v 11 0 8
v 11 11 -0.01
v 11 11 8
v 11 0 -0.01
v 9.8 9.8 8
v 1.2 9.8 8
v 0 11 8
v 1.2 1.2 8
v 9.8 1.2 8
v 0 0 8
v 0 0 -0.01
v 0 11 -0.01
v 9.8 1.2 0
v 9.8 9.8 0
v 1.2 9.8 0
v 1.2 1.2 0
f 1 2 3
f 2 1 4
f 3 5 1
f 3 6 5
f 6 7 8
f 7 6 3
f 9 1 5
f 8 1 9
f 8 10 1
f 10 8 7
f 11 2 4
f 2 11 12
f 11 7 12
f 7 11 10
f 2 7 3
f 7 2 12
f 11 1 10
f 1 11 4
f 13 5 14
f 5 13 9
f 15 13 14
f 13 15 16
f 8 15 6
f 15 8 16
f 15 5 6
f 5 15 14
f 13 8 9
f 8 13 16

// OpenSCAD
// file: ../Base/Rotation.scad
// Fischertechnik Box Foundation
// Geometry Helpers Rotation

include <PlacementOptions.scad>

// getRotatedSpace(space, rotation=NoRotation)
// Rotates the space dependent on the specified rotation

function getRotatedSpace(space, rotation=NoRotation) = [
    (rotation == Rotate90 || rotation == Rotate270) ? space.y : space.x,
    (rotation == Rotate90 || rotation == Rotate270) ? space.x : space.y
];

// Rotates the given space around the fixed left lower corner
// space = the space the children needs as width/depth list [width,depth]
// rotation = 0 Rotate0 degrees, 1 Rotate90 degrees, 2 Rotate180 degrees, 3 Rotate270 degrees (equivalent to -90)

module RotateFix(space, rotation=NoRotation) {
    dy = (rotation == Rotate0 || rotation == Rotate270) ? 0 :
        (rotation == Rotate90) ? space.x :
        space.y;
    dx = (rotation < Rotate180) ? 0 :
        (rotation == Rotate180) ? space.x :
        space.y;
    
    translate([dx, dy, 0])
        rotate([0, 0, rotations[rotation]])
            children();
}
// file: ../Base/Alignment.scad
// Fischertechnik Box Foundation
// Geometry Helpers Alignment

include <PlacementOptions.scad>

// getAlignedX(elementWidth, spaceWidth, align=AlignRight, offset=0)
// Gets the aligned X offset of an element with the given
// width in the given space.
// elementWidth = The width of the element to positon
// spaceWidth = The space where the element should be aligned
// align = 0 AlignLeft, 1 AlignCenter, 2 AlignRight
// offset = an optional offset from the aligned position. When
// aligned left or centered, then positive values are in X direction.
// When aligned right then positive values are in negative X direction.

function getAlignedX(elementWidth, spaceWidth, align=AlignRight, offset=0) =
    (align == AlignLeft) ?
        offset :
        ((align == AlignCenter) ?
        (spaceWidth - elementWidth)/2 + offset :
        spaceWidth - offset - elementWidth);

// getAlignedY(elementDepth, spaceDepth, align=AlignTop, offset=0)
// Gets the aligned Y offset of an element with the given
// depth in the given space.
// elementDepth = The depth of the element to positon
// spaceDepth = The space where the element should be aligned
// align = 0 AlignBottom, 1 AlignCenter, 2 AlignTop
// offset = an optional offset from the aligned position. When
// aligned bottom or centered, then positive values are in Y direction.
// When aligned top then positive values are in negative Y direction.

function getAlignedY(elementDepth, spaceDepth, align=AlignTop, offset=0) =
    (align == AlignBottom) ?
        offset :
        ((align == AlignCenter) ?
        (spaceDepth - elementDepth)/2 + offset :
        spaceDepth - offset - elementDepth);
// file: ../Base/PlacementOptions.scad
// Fischertechnik Box Foundation
// Placement Options

// Alignment
NoAlign = 0;
AlignLeft = 1;
AlignBottom = 2;
AlignCenter = 3;
AlignRight = 4;
AlignTop = 5;

// Element rotation degree steps
rotations = [0, -90, -180, -270];

// Rotation
NoRotation = 0;
Rotate0 = 0;
Rotate90 = 1;
Rotate180 = 2;
Rotate270 = 3;

// Docking (seen from above)
NoDock = -1;
DockLeft = 0;
DockTop = 1;
DockRight = 2;
DockCorner = 2;
DockBottom = 3;

// Web corners
LowerLeft = 0;
UpperLeft = 1;
UpperRight = 2;
LowerRight = 3;

// Web position relative to corner
LeftOfCorner = 0;
RightOfCorner = 1;
// file: ../Base/Boxes.scad
// Fischertechnik Box Foundation
// Pre-designed Boxes

use <Constants.scad>

include <PlacementOptions.scad>

box190Width = 190;
box190Depth = 130;
box130Width = 130;
box130Depth = 95;

// Values are from an original ec3 box
topBottomDifference = 1.5;
outerHeight = 40;
baseThickness = 1.8;
innerHeight = outerHeight - baseThickness;
stackExcess = 5.7;
radius = 3.5;
wallThickness = 1.5;
tolerance = 0.2;

boxWallThickness = wallThickness;
boxBaseThickness = baseThickness;
boxWebWidth = 3.0;

// getBoxWallThickness()
// Gets the wall thickness of a Fischertechnik Box
function getBoxWallThickness() = boxWallThickness;

// getBoxUsageHeight(height = 38.2)
// Gets the usable height of a Fischertechnik box
// height = Outer height of the box from the bottom to the upper edge.
function getBoxUsageHeight(height = outerHeight) = height - baseThickness - stackExcess;

// getBoxInnerHeight()
// Gets the inner height of a Fischertechnik box, including the stack excess
function getBoxInnerHeight() = innerHeight;

// getBoxBaseThickness()
// Gets the thickness of the Fischertechnik box base.
function getBoxBaseThickness() = boxBaseThickness;

// getBoxWebWidth()
// Gets the width of a box web
function getBoxWebWidth() = boxWebWidth;

// getBox190Space()
// Gets the usable inner space of a Box 190 as an x/y-list
function getBox190Space() = [
    box190Width - 2*getBoxWallThickness() - topBottomDifference, 
    box190Depth - 2*getBoxWallThickness() - topBottomDifference ];

// RoundedCornerPlate(width, depth, height, radius)
// Creates a body plate with rounded corners for a box. Used
// also to create the complete box with the hull module.
// width = Width of the plate
// depth = depth of the plate 
// height = thickness of the plate
// radius = radius of the rounded corner
module RoundedCornerPlate(width, depth, height, radius) {
    translate([radius, radius])
    hull() {
        w = width-2*radius;
        d = depth-2*radius;
        cube([w, d, height]);
        cylinder(height, r=radius, $fn=getFragments());
        translate([w, 0])
            cylinder(height, r=radius, $fn=getFragments());
        translate([w, d])
            cylinder(height, r=radius, $fn=getFragments());
        translate([0, d])
            cylinder(height, r=radius, $fn=getFragments());
    }
}

// BoxBase(width, depth)
// Creates an empty stackable Fischertechnik compatible box
// width = Outer width of the box (190, 130, ...)
// depth = Outer depth of the box (130, 95, ...)

module BoxBase(width, depth, height=outerHeight) {    
    thinPlate = 0.01;

    innerHeight = height - baseThickness;    
    
    module Body(tolerance=tolerance) {
        hull() {
            // Bottom with tolerance to fit into the original boxes when stacked
            translate([-wallThickness+tolerance, -wallThickness+tolerance, -baseThickness])
                RoundedCornerPlate(width-topBottomDifference-2*tolerance, depth-topBottomDifference-2*tolerance, thinPlate, radius);
            
            // Top
            translate([-wallThickness-topBottomDifference/2, -wallThickness-topBottomDifference/2, innerHeight-thinPlate])
                RoundedCornerPlate(width, depth, thinPlate, radius);
         }
    }

    module Cutoff() {
        hull() {
            coWidth = width - 2*wallThickness;
            coDepth = depth - 2*wallThickness;
            
            // Bottom
            RoundedCornerPlate(coWidth-topBottomDifference, coDepth-topBottomDifference, thinPlate, radius);

            // Top
            translate([-topBottomDifference/2, -topBottomDifference/2, innerHeight+thinPlate]) 
                RoundedCornerPlate(coWidth, coDepth, thinPlate, radius);
        }
    }
    
    difference() {        
        Body();
        Cutoff();
        stackOffset = innerHeight - stackExcess;
        translate([0, 0, stackOffset + baseThickness])
            Body(tolerance=0);
    }
}

// Creates the Fischertechnik empty box 130x190 mm and places it at position 0,0
// 190x130 are the outer sizes, the inner space is slightly smaller. Use getBox190Space() to get the inner sizes.
// The box is positioned that the usable inner space is at the 0,0,0 position.

module Box190() {
    BoxBase(box190Width, box190Depth);
}

// Gets the usable inner space of a Box 130 as an x/y-list
function getBox130Space() = [
    box130Width - 2*getBoxWallThickness() - topBottomDifference, 
    box130Depth - 2*getBoxWallThickness() - topBottomDifference ];

// Creates the Fischertechnik empty box 95x130 mm and places it at position 0,0
// 190x130 are the outer sizes, the inner space is slightly smaller. Use getBox190Space() to get the inner sizes.
// The box is positioned that the usable inner space is at the 0,0,0 position.

module Box130() {
    BoxBase(box130Width, box130Depth);
}

// Creates a web at the specified box walls
// corner 0 = LowerLeft, 1 = UpperLeft, 2 = UpperRight, 3 = LowerRight
// side 0 = LeftOfCorner, 1 = RightOfCorner
// distance = Distance in mm from the corner
// boxSpace = inner width and depth of the box (default: Box 190)
// webWidth = length of the web (default is 3 mms)
// webThickness = thickness of the web (default is 1 mm)
// height = Height of the web (standard is getBoxUsageHeight())
// sink = How much of the web is sunk into the wall

module BoxWeb(
    corner, 
    side, 
    distance, 
    boxSpace=getBox190Space(), 
    webWidth=getBoxWebWidth(), 
    webThickness=1.0, 
    height=getBoxUsageHeight(),
    sink = getBoxWallThickness()/2) {
    width = (corner % 2 == 0) ? 
            (side == LeftOfCorner ? webWidth : webThickness) :
            (side == LeftOfCorner ? webThickness : webWidth);

    depth = (corner % 2 == 0) ? 
            (side == RightOfCorner ? webWidth : webThickness) :
            (side == RightOfCorner ? webThickness : webWidth);
    
    xDiff = corner == LowerLeft ? 
                (side == LeftOfCorner ? -sink : distance) :
            (corner == UpperLeft ?                
                (side == LeftOfCorner ? distance : -sink) :
            (corner == UpperRight ?
                (side == LeftOfCorner ? boxSpace.x-webWidth+sink : boxSpace.x-distance-webThickness) :
                (side == LeftOfCorner ? boxSpace.x-distance-webThickness: boxSpace.x-webWidth+sink)));

    yDiff = corner == LowerLeft ? 
                (side == RightOfCorner ? -sink : distance) :
            (corner == UpperLeft ?
                (side == RightOfCorner ? boxSpace.y-distance-webThickness : boxSpace.y-webWidth+sink) :
            (corner == UpperRight ?
                (side == RightOfCorner ? boxSpace.y-webWidth+sink : boxSpace.y-distance-webThickness) :
                (side == RightOfCorner ? distance : -sink)));
    
    translate([xDiff, yDiff, -getExcess()])
        cube([width, depth, height + 2*getExcess()]);
}
// file: ../Base/Placement.scad
// Fischertechnik Box Foundation
// Geometry Helpers Placement

use <Constants.scad>
use <Alignment.scad>
use <Rotation.scad>
use <Boxes.scad>

include <PlacementOptions.scad>

// Place(x=0, y=0, elementSpace=[0,0], alignX=AlignLeft, alignY=AlignBottom, rotation=Rotate0, boxSpace=getBox190Space())
// Places the child at the specified position
// y = Y-Position. This is a relative position when an X aligment is specified.
// x = X-Position. This is a relative position when an Y aligment is specified.
// elementSpace = space of the element to be placed [x,y]
// alignX = -1=NoAlign, 0 AlignLeft, 1 AlignCenter, 3 AlignRight (elementSpace and boxSpace required!)
// alignY = -1=NoAlign, 2 AlignBottom, 1 AlignCenter, 4 AlignTop (elementSpace and boxSpace required!)
// rotation = 0 Rotate0 0 degrees, 1 Rotate90 90 degrees, 
// 2 Rotate180 180 degrees, 3 Rotate270 270 degrees (equivalent to -90)
// boxSpace = Inner space of the box where the placement occurs [x,y] - default is Box 190x130 inner space

module Place(x=0, y=0, elementSpace=[0,0], 
  alignX=AlignLeft, alignY=AlignBottom, 
  rotation=NoRotation, boxSpace=getBox190Space()) {

    module Position(x, y, space, rotation=Rotate0) {
        translate([x, y, 0])
            RotateFix(space, rotation)
                children();
    }

    space = getRotatedSpace(elementSpace, rotation);
    alignedX = getAlignedX(space.x, boxSpace.x, alignX, x);
    alignedY = getAlignedY(space.y, boxSpace.y, alignY, y);
    Position(alignedX, alignedY, elementSpace, rotation)
        children();
}

// Center(space=getBox130Space(), elementSpace=[0,0])
// space = Space where the children is centered. For cylinder use centered=true and no elementSpace.
// elementSpace = space of the element to be centered [x,y]

module Center(space=getBox190Space(), elementSpace=[0,0]) {
    Place(elementSpace=elementSpace, boxSpace=space, alignX=AlignCenter, alignY=AlignCenter)
        children();
}

// CenterHorizontal(width=0, y=0, offset=0, space=getBox130Space())
// width = Width of the element to be placed.
// y = Y position of the element
// offset = Offset from the center position (negative will be left of the center)
// space = Space where the element is placed

module CenterHorizontal(width=0, y=0, offset=0, space=getBox190Space()) {
    Place(x=offset, y=y, elementSpace=[width, 0], boxSpace=space, alignX=AlignCenter)
        children(0);
}

// CenterVertical(depth=0, x=0, offset=0, space=getBox130Space())
// depth = Depth of the element to be placed.
// x = X position of the element
// offset = Offset from the center position (negative will be down of the center)
// space = Space where the element is placed

module CenterVertical(depth=0, x=0, offset=0, space=getBox190Space()) {
    Place(x=x, y=offset, elementSpace=[0, depth], boxSpace=space, alignY=AlignCenter)
        children(0);
}

// getIsVertical(align)
// True if the specified alignment needs a vertical orientation for a divider (AlignRight, AlignLeft)

function getIsVertical(align) = (align == AlignRight || align == AlignLeft);

// getIsHorizontal(align)
// True if the specified alignment needs a horizontal orientation for a divider (AlignTop, AlignBottom)

function getIsHorizontal(align) = (align == AlignTop || align == AlignBottom);
// file: ../Base/Constants.scad
// Fischertechnik Box Foundation
// Constants

// Constant values necessary for multiple elements

// Base constants
dividerThickness = 1.2;
excess = 0.01;
fragments = 90;
tolerance = 0.8;

// Gets the thickness of a divider 
function getDividerThickness() = dividerThickness;

// Gets the excess that is used to merge walls into each other
function getExcess() = excess;

// Gets amount of fragments of a cylinder
function getFragments() = fragments;

// Gets the inner tolerance of a frame to each side
function getTolerance() = tolerance;


// Fischertechnik specific constants
axisDiameter = 4;
axisBottomDiameter = axisDiameter + 1;
axisTolerance = 0.2;

// Gets axis diameter of Fischertechnik axis
function getAxisDiameter() = axisDiameter;

// Gets axis diameter tolerance (subtracted for element axis)
function getAxisTolerance() = axisTolerance;

// Gets the axis diameter for standing axis
function getStandAxisDiameter() = getAxisDiameter() - getAxisTolerance();

// Gets axis bottom diameter for thicker part at the bottom
function getAxisBottomDiameter() = axisBottomDiameter;

pinHeight = 2.5;

// gets the height of a connecting pin
function getPinHeight() = pinHeight;

standardEdgeDistance = 2.5;
standardWebDistance = 11.5;
standardCornerLength = 15;

// gets the standard distance to the wall of the box for dockable frames with webs
function getStandardEdgeDistance() = standardEdgeDistance;

// gets the standard distance of each web to the corner of the dockable frame
function getStandardWebDistance() = standardWebDistance;

// gets the standard length of the corner walls of a dockable frame
function getStandardCornerLength() = standardCornerLength;

tubeWallFactor = 0.8;

// gets the wall thickness of a tube.
function getTubeWallThickness() = tubeWallFactor * getDividerThickness();

smallPartsFrameHeight = 20;

// gets the frame height for docked small parts boxes.
function getSmallPartsFrameHeight() = smallPartsFrameHeight;

hubRingDiameter = 19.5;
hubRingLevelDiameter = 21;

// gets the diameter of a tube matching the inner ring of a wheel
function getHubRingDiameter() = hubRingDiameter;

// gets the diameter of a hub tube with a thicker diameter
function getHubRingLevelDiameter() = hubRingLevelDiameter;
// main file
// Fischertechnik Box Library
// Frame for Short Hook
// 38225

use <../ModelBase/Simple.scad>

/* [Hidden] */
width = 7.8;
depth = 7.8;
height = 8;

// getFrameShortHookSpace()
// Gets the space of a frame for a short hook

function getFrameShortHookSpace() = getFrameOuterVolume([width, depth, height]);

// FrameShortHook()
// Frame for short hook.

module FrameShortHook() {
    Frame([width, depth, height]);
}

// Tests
color("lightgray")
FrameShortHook();
